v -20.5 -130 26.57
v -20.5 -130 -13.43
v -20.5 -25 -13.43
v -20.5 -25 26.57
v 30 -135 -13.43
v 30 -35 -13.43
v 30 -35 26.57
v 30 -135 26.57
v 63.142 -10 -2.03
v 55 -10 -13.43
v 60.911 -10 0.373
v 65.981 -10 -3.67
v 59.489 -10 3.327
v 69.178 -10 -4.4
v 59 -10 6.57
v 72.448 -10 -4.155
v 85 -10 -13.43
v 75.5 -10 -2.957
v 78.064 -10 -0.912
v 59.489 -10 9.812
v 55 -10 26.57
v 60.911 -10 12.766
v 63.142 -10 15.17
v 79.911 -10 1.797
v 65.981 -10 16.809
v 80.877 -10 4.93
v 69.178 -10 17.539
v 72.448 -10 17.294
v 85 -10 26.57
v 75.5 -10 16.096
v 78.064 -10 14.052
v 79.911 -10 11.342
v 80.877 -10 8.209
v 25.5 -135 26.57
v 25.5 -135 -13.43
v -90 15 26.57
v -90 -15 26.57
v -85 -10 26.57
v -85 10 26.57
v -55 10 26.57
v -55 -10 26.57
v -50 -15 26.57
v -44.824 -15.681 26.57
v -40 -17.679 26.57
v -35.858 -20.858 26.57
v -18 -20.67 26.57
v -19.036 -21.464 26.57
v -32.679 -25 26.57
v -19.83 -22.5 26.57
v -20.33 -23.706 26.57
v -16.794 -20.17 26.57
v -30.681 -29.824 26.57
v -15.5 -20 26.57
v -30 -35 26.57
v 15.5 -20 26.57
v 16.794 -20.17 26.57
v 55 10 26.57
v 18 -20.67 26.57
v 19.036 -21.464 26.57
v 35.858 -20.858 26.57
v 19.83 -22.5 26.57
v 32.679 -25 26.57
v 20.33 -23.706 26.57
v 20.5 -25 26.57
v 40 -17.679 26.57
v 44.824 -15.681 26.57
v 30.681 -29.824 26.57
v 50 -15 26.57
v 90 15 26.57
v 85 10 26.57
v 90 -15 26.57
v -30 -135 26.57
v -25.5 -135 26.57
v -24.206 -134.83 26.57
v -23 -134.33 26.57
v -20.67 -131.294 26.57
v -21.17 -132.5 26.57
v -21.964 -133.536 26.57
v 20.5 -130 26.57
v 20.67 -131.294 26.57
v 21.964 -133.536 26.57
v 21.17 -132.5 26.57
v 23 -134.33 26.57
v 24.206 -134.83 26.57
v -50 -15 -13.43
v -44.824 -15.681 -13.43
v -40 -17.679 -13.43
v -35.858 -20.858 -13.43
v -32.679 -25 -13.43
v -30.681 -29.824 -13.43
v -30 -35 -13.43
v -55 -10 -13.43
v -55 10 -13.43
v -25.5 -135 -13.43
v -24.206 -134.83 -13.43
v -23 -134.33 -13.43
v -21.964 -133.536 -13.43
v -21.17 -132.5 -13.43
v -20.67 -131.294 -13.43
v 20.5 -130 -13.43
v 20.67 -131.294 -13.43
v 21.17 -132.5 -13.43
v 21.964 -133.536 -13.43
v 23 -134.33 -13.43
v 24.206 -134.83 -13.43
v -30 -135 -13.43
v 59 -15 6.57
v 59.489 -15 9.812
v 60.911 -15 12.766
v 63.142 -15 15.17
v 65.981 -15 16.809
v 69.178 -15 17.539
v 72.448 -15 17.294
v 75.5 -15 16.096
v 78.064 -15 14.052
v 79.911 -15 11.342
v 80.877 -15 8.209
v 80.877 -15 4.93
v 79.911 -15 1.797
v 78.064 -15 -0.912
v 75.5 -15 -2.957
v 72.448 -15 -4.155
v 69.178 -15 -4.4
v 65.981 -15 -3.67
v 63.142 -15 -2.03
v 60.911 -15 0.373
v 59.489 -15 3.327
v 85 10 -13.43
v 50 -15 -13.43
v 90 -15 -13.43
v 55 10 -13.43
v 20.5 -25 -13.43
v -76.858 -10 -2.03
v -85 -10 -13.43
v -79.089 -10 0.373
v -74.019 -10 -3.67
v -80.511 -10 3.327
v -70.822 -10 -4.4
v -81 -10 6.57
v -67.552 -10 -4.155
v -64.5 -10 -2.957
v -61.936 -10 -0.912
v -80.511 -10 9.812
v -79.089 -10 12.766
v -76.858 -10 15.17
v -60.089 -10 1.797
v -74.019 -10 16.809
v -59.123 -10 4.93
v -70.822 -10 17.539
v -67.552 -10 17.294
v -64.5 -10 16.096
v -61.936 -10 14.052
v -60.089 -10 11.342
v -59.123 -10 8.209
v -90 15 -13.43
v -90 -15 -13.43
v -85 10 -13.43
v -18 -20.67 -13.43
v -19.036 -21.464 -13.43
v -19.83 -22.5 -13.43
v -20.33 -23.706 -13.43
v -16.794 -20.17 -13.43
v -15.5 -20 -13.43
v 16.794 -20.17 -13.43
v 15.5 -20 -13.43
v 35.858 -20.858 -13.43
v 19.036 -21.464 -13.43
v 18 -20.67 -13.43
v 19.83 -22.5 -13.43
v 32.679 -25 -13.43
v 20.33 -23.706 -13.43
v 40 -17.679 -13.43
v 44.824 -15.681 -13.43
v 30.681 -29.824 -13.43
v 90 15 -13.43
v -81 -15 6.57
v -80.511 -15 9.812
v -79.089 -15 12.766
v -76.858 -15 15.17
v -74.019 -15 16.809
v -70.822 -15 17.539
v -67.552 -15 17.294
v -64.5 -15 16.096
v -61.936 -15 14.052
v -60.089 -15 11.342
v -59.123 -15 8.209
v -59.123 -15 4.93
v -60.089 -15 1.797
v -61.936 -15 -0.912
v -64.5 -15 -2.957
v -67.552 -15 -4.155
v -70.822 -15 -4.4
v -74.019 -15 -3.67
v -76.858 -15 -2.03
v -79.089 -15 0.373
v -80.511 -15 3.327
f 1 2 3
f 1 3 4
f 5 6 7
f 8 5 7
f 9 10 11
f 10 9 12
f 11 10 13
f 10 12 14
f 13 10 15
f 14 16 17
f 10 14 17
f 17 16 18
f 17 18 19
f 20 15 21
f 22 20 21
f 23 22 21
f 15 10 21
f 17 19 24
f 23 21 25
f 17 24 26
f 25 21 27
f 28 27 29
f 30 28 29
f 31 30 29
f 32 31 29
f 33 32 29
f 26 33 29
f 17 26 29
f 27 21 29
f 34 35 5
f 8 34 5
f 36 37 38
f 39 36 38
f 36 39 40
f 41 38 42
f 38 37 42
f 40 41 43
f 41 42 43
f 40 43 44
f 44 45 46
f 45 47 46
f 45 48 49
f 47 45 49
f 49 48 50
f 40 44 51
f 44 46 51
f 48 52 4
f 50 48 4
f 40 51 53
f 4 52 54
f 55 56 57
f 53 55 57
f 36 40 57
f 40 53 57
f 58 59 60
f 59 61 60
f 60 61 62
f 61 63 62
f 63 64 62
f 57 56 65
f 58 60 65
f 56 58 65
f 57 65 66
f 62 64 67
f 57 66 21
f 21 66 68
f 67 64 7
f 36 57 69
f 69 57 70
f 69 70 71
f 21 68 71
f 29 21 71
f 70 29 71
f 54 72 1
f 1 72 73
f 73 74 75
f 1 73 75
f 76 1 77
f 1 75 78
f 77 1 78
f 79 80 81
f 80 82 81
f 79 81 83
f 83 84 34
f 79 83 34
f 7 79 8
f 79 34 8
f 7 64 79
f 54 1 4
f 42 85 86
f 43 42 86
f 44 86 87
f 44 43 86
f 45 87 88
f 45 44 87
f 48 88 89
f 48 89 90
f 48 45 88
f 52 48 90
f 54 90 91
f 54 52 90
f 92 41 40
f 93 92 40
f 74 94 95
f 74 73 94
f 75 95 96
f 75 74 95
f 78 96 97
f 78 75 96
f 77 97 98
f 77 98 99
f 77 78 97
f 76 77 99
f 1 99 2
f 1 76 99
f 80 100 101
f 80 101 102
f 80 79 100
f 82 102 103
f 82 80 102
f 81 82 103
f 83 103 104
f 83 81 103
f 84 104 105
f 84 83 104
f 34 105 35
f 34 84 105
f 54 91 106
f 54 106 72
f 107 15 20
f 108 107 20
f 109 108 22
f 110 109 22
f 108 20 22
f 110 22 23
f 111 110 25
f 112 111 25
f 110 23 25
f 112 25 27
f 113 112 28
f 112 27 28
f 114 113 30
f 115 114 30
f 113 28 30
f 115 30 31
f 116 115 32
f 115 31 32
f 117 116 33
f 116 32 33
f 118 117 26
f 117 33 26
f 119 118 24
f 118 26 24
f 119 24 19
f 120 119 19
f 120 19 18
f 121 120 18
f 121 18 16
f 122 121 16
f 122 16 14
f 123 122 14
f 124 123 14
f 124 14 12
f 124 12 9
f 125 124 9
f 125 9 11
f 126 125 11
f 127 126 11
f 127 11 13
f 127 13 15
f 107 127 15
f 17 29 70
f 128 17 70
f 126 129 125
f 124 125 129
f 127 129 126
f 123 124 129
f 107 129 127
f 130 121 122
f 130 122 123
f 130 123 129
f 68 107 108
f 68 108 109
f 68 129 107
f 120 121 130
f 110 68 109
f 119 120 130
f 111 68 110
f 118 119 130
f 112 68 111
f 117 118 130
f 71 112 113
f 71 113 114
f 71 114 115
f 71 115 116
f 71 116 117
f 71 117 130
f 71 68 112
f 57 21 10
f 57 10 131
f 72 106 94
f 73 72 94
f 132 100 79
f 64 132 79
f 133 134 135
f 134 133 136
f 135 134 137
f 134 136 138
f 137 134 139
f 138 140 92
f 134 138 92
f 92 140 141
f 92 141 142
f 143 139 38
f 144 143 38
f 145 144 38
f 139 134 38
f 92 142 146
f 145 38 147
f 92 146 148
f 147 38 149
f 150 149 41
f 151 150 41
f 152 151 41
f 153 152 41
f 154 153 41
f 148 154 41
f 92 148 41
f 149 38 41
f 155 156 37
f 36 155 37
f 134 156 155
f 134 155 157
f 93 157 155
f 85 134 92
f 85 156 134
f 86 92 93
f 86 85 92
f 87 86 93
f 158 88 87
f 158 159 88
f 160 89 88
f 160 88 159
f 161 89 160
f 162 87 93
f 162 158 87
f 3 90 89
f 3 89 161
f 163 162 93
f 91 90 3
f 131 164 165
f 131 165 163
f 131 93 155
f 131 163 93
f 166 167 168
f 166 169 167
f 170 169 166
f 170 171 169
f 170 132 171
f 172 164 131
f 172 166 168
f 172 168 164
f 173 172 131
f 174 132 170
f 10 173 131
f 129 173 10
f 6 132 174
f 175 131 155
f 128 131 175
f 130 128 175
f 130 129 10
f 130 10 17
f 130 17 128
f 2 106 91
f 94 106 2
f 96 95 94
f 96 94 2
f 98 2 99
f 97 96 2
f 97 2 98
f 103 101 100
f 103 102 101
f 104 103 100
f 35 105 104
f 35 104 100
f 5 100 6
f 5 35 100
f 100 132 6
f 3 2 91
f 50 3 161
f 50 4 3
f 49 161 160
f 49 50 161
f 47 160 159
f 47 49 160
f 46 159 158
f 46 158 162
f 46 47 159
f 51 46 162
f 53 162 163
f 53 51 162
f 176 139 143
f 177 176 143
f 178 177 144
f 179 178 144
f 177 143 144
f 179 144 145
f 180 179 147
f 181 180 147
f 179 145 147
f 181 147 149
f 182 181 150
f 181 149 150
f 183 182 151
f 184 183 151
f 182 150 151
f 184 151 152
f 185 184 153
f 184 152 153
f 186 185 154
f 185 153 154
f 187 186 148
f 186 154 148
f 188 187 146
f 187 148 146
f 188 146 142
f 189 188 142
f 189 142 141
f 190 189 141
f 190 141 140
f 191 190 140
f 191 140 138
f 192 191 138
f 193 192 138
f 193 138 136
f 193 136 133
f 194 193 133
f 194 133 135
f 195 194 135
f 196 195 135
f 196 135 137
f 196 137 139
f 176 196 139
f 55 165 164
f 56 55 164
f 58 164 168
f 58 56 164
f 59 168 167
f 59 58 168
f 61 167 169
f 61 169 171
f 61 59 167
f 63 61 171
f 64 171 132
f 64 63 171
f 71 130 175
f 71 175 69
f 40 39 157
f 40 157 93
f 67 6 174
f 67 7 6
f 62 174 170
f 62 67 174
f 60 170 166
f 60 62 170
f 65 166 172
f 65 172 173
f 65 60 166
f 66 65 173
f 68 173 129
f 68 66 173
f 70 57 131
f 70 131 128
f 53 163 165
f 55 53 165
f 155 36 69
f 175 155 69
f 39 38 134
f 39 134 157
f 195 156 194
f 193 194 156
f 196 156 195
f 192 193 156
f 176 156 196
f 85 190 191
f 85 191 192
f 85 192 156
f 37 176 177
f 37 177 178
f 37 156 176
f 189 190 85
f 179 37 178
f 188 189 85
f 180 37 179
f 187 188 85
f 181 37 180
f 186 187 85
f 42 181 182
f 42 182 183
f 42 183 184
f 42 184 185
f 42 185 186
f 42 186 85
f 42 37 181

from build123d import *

# Parameters (mm, degrees)
F0_W      = 180
F0_H      = 40
F1_DEPTH  = 15
F2_W      = 60
F2_H      = 40
F3_DEPTH  = 120
F4_W      = 41
F4_H      = 40
F5_DEPTH  = 115
F6_R      = 20
F7_R      = 5
F8_W      = 30
F8_H      = 20
F9_DEPTH  = 40
F10_W     = 30
F10_H     = 20
F11_DEPTH = 40
F13_D     = 22
F13_DEPTH = 12
F13_TIP   = 6.6094668093
F15_D     = 22
F15_DEPTH = 12
F15_TIP   = 6.6094668093


with BuildPart() as f1:
    # F0 (on Front) → F1 (new body, symmetric)
    with BuildSketch(Plane.XZ):
        with Locations((0, 6.5696623251)):
            Rectangle(F0_W, F0_H)
    extrude(amount=F1_DEPTH, both=True)

    # F2 (on face) → F3 (join)
    with BuildSketch(Plane.XZ.offset(15)):
        with Locations((0, 6.5696623251)):
            Rectangle(F2_W, F2_H)
    extrude(amount=F3_DEPTH)

    # F4 (on face) → F5 (cut)
    with BuildSketch(Plane.XZ.offset(135)):
        with Locations((0, 6.5696623251)):
            Rectangle(F4_W, F4_H)
    extrude(amount=-F5_DEPTH, mode=Mode.SUBTRACT)

    # F6
    f6_edges = [f1.edges().sort_by_distance(p)[0] for p in [
        (-30, -15, 6.569662),
        (30, -15, 6.569662),
    ]]
    fillet(f6_edges, radius=F6_R)

    # F7
    f7_edges = [f1.edges().sort_by_distance(p)[0] for p in [
        (-20.5, -20, 6.569662),
        (20.5, -20, 6.569662),
        (-20.5, -135, 6.569662),
        (20.5, -135, 6.569662),
    ]]
    fillet(f7_edges, radius=F7_R)

    # F8 (on face) → F9 (cut)
    with BuildSketch(Plane.XY.offset(26.5696623251)):
        with Locations((-70, 0)):
            Rectangle(F8_W, F8_H)
    extrude(amount=-F9_DEPTH, mode=Mode.SUBTRACT)

    # F10 (on face) → F11 (cut)
    with BuildSketch(Plane.XY.offset(26.5696623251)):
        with Locations((70, 0)):
            Rectangle(F10_W, F10_H)
    extrude(amount=-F11_DEPTH, mode=Mode.SUBTRACT)

    # F13
    with Locations(Plane.XZ.offset(15)):
        with Locations((-70, 6.5696623251)):
            Hole(F13_D / 2, depth=F13_DEPTH)
            with Locations((0, 0, -(F13_DEPTH + F13_TIP / 2))):  # 118° drill point
                Cone(0, F13_D / 2, F13_TIP, mode=Mode.SUBTRACT)

    # F15
    with Locations(Plane.XZ.offset(15)):
        with Locations((70, 6.5696623251)):
            Hole(F15_D / 2, depth=F15_DEPTH)
            with Locations((0, 0, -(F15_DEPTH + F15_TIP / 2))):  # 118° drill point
                Cone(0, F15_D / 2, F15_TIP, mode=Mode.SUBTRACT)


solid = f1.part
